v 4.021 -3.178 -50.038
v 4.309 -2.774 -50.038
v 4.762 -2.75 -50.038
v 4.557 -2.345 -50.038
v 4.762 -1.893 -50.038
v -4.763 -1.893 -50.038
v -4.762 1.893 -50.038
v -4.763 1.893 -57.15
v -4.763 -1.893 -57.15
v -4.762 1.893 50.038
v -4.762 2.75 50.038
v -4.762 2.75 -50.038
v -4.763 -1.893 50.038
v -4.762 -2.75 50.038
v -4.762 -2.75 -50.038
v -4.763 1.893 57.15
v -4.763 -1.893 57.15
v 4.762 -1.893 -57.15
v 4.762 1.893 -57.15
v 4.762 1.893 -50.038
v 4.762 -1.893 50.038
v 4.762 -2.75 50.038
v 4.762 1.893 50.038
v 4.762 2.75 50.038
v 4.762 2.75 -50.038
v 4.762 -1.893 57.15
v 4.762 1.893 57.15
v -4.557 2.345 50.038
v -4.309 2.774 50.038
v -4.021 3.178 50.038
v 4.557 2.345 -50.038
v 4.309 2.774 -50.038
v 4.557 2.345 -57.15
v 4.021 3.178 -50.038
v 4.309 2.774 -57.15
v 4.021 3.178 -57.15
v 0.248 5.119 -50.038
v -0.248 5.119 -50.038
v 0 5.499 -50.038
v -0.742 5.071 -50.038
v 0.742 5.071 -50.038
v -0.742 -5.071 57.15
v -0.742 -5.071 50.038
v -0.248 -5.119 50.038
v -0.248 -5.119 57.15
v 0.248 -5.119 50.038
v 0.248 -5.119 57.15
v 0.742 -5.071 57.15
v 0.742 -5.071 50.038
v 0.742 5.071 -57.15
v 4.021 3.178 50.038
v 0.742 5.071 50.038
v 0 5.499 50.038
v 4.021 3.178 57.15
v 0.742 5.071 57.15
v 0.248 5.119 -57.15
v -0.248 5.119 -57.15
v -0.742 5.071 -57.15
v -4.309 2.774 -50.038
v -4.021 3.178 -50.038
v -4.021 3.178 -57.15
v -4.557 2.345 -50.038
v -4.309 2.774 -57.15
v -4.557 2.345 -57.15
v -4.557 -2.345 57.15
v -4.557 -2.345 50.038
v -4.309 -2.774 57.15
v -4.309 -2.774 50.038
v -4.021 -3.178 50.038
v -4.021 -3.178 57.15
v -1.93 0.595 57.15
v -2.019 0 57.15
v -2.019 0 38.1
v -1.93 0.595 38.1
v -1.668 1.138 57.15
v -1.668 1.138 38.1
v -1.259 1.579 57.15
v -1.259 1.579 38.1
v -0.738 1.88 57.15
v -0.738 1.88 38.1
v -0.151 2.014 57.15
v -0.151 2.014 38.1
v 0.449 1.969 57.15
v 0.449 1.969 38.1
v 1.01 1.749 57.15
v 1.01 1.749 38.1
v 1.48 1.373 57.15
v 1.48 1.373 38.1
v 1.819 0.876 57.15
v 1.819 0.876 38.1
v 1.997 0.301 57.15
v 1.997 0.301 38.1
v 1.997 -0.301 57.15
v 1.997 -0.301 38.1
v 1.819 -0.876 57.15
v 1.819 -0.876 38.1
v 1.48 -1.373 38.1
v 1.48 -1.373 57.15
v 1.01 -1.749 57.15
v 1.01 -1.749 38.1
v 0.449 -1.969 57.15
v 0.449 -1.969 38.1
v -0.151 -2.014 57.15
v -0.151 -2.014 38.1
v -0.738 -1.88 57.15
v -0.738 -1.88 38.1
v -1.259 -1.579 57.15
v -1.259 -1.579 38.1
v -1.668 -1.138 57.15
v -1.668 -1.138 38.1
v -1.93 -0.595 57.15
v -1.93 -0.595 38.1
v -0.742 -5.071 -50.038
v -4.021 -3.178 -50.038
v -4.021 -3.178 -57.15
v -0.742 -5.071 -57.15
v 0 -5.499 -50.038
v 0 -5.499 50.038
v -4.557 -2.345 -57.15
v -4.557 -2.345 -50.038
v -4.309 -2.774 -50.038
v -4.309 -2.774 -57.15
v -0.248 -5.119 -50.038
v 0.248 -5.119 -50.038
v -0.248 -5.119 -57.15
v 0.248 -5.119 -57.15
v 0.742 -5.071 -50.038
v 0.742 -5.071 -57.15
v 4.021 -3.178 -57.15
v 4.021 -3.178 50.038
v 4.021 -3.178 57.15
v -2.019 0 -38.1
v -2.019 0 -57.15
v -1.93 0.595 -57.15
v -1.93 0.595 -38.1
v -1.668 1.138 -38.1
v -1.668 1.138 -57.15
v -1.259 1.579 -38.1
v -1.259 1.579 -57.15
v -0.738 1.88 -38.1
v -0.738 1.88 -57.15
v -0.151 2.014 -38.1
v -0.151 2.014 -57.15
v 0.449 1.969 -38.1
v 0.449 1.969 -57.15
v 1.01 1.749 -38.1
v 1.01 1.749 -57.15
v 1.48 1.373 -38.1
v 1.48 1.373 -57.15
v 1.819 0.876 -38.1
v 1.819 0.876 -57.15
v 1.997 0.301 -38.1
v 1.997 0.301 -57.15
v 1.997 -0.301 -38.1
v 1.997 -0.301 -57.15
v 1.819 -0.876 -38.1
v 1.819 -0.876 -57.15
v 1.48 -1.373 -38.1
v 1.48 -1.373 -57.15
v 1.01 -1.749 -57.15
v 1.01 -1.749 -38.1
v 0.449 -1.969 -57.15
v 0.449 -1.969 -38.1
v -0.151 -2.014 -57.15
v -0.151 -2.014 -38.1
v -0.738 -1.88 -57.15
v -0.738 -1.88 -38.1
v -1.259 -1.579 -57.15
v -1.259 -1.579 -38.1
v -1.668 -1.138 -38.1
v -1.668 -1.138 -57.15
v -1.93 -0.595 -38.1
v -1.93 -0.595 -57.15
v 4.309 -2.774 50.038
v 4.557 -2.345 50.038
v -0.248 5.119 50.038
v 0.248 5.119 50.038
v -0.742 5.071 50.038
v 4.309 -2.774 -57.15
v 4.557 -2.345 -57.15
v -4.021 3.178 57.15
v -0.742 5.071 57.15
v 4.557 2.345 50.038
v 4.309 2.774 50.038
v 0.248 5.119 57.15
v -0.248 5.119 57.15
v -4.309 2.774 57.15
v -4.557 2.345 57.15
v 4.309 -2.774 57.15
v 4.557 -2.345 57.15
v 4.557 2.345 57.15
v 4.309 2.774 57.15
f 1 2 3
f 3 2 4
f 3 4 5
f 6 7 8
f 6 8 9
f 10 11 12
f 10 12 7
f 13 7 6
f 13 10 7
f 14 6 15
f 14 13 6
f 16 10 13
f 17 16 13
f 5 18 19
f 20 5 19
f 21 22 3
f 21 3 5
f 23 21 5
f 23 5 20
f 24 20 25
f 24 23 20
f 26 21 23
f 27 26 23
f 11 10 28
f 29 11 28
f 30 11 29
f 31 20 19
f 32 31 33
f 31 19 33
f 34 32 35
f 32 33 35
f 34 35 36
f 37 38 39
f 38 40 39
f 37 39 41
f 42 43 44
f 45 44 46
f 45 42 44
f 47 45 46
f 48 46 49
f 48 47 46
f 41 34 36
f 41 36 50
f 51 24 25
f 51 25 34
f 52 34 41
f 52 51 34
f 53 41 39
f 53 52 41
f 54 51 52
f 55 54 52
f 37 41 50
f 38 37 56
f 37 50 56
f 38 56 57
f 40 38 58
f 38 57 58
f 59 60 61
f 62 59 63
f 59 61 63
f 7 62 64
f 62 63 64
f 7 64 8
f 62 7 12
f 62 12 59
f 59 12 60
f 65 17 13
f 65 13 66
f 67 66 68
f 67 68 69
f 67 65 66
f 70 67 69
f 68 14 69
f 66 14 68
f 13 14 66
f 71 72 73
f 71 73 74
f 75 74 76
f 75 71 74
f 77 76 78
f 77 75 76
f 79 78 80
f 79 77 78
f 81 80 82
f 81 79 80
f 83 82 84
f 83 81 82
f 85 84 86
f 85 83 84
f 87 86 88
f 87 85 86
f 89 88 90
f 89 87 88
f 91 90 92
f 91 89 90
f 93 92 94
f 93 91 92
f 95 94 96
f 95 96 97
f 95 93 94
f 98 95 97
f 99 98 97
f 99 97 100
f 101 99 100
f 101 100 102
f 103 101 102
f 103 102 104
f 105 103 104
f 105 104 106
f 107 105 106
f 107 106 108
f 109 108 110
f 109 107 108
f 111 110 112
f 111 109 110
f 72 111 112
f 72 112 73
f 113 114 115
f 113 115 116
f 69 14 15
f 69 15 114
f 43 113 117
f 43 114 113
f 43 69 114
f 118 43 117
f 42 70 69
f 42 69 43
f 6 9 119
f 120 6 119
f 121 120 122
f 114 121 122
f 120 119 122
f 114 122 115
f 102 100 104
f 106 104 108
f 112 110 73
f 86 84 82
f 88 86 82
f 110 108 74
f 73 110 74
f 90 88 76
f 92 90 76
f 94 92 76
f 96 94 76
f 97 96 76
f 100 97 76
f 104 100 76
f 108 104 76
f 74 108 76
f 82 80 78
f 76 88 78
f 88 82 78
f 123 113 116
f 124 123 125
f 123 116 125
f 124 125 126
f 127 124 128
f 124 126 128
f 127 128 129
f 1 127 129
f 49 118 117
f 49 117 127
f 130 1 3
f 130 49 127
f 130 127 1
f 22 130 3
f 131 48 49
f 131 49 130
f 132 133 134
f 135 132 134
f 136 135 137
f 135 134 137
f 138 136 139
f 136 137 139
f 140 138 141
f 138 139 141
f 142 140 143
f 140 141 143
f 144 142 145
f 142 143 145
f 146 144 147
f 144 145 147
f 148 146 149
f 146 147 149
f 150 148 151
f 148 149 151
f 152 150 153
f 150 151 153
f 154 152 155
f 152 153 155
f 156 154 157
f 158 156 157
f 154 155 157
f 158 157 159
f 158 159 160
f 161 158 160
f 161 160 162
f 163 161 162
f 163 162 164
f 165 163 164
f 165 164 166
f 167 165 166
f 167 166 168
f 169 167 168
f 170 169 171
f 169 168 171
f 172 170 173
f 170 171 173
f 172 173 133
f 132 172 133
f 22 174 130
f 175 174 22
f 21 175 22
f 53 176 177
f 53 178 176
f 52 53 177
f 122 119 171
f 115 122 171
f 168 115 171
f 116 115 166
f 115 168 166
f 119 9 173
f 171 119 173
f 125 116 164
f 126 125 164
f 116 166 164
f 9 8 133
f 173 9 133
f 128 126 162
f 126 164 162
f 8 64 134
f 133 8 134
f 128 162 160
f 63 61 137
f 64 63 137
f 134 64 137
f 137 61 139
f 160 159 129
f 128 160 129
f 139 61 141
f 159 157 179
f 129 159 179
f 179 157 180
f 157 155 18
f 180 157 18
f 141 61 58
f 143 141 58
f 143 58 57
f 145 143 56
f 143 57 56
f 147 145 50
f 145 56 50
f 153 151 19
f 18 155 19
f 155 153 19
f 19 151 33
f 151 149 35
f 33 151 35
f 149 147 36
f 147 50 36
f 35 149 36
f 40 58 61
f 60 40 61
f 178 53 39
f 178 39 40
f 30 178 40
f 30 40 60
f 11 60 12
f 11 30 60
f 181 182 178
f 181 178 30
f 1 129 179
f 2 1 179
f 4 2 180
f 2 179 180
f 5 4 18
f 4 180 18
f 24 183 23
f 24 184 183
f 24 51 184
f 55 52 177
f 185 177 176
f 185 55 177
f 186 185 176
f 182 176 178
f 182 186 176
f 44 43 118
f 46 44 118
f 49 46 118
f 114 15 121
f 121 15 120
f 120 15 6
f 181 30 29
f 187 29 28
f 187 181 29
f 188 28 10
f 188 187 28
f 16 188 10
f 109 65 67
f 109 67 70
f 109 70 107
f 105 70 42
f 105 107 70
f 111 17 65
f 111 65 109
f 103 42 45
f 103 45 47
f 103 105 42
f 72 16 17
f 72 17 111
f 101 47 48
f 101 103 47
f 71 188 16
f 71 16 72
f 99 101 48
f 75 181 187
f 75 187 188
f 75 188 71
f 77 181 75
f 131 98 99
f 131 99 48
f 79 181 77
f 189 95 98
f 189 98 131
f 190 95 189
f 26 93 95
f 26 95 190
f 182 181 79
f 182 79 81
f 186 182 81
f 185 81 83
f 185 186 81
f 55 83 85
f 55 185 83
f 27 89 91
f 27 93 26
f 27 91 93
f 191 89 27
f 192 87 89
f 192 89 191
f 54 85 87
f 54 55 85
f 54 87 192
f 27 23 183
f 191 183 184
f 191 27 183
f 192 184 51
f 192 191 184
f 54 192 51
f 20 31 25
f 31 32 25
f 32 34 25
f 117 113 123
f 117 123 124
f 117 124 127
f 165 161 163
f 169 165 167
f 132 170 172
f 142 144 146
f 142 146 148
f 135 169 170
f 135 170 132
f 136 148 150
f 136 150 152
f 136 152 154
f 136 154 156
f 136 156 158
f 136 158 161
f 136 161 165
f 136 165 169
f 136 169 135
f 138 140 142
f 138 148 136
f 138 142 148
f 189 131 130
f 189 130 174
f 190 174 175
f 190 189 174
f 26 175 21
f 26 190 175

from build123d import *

# Parameters (mm, degrees)
BOSS_EXTRUDE1_DEPTH = 57.15
SKETCH2_R           = 2.0193
CUT_EXTRUDE1_DEPTH  = 19.05
SKETCH4_R           = 7.057360916
SKETCH4_R_2         = 5.125
CUT_EXTRUDE2_DEPTH  = 7.112


with BuildPart() as part:
    # Sketch1 → Boss-Extrude1 (new, symmetric)
    with BuildSketch(Plane.XY):
        Polygon((4.7625, 2.749630657), (0, 5.499261314), (-4.7625, 2.749630657), (-4.7625, -2.749630657), (0, -5.499261314), (4.7625, -2.749630657), align=None)
    extrude(amount=BOSS_EXTRUDE1_DEPTH, both=True)

    # Sketch2 → Cut-Extrude1 (cut)
    with BuildSketch(Plane(origin=(0, 0, -57.15), x_dir=(-1, 0, 0), z_dir=(0, 0, -1))):
        Circle(SKETCH2_R)
    cut_extrude1 = extrude(amount=-CUT_EXTRUDE1_DEPTH, mode=Mode.SUBTRACT)

    # Mirror1: Cut-Extrude1 across plane
    add(cut_extrude1.mirror(Plane.XY), mode=Mode.SUBTRACT)

    # Sketch4 → Cut-Extrude2 (cut)
    with BuildSketch(Plane.XY.offset(57.15)):
        Circle(SKETCH4_R)
        Circle(SKETCH4_R_2, mode=Mode.SUBTRACT)
    cut_extrude2 = extrude(amount=-CUT_EXTRUDE2_DEPTH, mode=Mode.SUBTRACT)

    # Mirror2: Cut-Extrude2 across plane
    add(cut_extrude2.mirror(Plane.XY), mode=Mode.SUBTRACT)


solid = part.part
